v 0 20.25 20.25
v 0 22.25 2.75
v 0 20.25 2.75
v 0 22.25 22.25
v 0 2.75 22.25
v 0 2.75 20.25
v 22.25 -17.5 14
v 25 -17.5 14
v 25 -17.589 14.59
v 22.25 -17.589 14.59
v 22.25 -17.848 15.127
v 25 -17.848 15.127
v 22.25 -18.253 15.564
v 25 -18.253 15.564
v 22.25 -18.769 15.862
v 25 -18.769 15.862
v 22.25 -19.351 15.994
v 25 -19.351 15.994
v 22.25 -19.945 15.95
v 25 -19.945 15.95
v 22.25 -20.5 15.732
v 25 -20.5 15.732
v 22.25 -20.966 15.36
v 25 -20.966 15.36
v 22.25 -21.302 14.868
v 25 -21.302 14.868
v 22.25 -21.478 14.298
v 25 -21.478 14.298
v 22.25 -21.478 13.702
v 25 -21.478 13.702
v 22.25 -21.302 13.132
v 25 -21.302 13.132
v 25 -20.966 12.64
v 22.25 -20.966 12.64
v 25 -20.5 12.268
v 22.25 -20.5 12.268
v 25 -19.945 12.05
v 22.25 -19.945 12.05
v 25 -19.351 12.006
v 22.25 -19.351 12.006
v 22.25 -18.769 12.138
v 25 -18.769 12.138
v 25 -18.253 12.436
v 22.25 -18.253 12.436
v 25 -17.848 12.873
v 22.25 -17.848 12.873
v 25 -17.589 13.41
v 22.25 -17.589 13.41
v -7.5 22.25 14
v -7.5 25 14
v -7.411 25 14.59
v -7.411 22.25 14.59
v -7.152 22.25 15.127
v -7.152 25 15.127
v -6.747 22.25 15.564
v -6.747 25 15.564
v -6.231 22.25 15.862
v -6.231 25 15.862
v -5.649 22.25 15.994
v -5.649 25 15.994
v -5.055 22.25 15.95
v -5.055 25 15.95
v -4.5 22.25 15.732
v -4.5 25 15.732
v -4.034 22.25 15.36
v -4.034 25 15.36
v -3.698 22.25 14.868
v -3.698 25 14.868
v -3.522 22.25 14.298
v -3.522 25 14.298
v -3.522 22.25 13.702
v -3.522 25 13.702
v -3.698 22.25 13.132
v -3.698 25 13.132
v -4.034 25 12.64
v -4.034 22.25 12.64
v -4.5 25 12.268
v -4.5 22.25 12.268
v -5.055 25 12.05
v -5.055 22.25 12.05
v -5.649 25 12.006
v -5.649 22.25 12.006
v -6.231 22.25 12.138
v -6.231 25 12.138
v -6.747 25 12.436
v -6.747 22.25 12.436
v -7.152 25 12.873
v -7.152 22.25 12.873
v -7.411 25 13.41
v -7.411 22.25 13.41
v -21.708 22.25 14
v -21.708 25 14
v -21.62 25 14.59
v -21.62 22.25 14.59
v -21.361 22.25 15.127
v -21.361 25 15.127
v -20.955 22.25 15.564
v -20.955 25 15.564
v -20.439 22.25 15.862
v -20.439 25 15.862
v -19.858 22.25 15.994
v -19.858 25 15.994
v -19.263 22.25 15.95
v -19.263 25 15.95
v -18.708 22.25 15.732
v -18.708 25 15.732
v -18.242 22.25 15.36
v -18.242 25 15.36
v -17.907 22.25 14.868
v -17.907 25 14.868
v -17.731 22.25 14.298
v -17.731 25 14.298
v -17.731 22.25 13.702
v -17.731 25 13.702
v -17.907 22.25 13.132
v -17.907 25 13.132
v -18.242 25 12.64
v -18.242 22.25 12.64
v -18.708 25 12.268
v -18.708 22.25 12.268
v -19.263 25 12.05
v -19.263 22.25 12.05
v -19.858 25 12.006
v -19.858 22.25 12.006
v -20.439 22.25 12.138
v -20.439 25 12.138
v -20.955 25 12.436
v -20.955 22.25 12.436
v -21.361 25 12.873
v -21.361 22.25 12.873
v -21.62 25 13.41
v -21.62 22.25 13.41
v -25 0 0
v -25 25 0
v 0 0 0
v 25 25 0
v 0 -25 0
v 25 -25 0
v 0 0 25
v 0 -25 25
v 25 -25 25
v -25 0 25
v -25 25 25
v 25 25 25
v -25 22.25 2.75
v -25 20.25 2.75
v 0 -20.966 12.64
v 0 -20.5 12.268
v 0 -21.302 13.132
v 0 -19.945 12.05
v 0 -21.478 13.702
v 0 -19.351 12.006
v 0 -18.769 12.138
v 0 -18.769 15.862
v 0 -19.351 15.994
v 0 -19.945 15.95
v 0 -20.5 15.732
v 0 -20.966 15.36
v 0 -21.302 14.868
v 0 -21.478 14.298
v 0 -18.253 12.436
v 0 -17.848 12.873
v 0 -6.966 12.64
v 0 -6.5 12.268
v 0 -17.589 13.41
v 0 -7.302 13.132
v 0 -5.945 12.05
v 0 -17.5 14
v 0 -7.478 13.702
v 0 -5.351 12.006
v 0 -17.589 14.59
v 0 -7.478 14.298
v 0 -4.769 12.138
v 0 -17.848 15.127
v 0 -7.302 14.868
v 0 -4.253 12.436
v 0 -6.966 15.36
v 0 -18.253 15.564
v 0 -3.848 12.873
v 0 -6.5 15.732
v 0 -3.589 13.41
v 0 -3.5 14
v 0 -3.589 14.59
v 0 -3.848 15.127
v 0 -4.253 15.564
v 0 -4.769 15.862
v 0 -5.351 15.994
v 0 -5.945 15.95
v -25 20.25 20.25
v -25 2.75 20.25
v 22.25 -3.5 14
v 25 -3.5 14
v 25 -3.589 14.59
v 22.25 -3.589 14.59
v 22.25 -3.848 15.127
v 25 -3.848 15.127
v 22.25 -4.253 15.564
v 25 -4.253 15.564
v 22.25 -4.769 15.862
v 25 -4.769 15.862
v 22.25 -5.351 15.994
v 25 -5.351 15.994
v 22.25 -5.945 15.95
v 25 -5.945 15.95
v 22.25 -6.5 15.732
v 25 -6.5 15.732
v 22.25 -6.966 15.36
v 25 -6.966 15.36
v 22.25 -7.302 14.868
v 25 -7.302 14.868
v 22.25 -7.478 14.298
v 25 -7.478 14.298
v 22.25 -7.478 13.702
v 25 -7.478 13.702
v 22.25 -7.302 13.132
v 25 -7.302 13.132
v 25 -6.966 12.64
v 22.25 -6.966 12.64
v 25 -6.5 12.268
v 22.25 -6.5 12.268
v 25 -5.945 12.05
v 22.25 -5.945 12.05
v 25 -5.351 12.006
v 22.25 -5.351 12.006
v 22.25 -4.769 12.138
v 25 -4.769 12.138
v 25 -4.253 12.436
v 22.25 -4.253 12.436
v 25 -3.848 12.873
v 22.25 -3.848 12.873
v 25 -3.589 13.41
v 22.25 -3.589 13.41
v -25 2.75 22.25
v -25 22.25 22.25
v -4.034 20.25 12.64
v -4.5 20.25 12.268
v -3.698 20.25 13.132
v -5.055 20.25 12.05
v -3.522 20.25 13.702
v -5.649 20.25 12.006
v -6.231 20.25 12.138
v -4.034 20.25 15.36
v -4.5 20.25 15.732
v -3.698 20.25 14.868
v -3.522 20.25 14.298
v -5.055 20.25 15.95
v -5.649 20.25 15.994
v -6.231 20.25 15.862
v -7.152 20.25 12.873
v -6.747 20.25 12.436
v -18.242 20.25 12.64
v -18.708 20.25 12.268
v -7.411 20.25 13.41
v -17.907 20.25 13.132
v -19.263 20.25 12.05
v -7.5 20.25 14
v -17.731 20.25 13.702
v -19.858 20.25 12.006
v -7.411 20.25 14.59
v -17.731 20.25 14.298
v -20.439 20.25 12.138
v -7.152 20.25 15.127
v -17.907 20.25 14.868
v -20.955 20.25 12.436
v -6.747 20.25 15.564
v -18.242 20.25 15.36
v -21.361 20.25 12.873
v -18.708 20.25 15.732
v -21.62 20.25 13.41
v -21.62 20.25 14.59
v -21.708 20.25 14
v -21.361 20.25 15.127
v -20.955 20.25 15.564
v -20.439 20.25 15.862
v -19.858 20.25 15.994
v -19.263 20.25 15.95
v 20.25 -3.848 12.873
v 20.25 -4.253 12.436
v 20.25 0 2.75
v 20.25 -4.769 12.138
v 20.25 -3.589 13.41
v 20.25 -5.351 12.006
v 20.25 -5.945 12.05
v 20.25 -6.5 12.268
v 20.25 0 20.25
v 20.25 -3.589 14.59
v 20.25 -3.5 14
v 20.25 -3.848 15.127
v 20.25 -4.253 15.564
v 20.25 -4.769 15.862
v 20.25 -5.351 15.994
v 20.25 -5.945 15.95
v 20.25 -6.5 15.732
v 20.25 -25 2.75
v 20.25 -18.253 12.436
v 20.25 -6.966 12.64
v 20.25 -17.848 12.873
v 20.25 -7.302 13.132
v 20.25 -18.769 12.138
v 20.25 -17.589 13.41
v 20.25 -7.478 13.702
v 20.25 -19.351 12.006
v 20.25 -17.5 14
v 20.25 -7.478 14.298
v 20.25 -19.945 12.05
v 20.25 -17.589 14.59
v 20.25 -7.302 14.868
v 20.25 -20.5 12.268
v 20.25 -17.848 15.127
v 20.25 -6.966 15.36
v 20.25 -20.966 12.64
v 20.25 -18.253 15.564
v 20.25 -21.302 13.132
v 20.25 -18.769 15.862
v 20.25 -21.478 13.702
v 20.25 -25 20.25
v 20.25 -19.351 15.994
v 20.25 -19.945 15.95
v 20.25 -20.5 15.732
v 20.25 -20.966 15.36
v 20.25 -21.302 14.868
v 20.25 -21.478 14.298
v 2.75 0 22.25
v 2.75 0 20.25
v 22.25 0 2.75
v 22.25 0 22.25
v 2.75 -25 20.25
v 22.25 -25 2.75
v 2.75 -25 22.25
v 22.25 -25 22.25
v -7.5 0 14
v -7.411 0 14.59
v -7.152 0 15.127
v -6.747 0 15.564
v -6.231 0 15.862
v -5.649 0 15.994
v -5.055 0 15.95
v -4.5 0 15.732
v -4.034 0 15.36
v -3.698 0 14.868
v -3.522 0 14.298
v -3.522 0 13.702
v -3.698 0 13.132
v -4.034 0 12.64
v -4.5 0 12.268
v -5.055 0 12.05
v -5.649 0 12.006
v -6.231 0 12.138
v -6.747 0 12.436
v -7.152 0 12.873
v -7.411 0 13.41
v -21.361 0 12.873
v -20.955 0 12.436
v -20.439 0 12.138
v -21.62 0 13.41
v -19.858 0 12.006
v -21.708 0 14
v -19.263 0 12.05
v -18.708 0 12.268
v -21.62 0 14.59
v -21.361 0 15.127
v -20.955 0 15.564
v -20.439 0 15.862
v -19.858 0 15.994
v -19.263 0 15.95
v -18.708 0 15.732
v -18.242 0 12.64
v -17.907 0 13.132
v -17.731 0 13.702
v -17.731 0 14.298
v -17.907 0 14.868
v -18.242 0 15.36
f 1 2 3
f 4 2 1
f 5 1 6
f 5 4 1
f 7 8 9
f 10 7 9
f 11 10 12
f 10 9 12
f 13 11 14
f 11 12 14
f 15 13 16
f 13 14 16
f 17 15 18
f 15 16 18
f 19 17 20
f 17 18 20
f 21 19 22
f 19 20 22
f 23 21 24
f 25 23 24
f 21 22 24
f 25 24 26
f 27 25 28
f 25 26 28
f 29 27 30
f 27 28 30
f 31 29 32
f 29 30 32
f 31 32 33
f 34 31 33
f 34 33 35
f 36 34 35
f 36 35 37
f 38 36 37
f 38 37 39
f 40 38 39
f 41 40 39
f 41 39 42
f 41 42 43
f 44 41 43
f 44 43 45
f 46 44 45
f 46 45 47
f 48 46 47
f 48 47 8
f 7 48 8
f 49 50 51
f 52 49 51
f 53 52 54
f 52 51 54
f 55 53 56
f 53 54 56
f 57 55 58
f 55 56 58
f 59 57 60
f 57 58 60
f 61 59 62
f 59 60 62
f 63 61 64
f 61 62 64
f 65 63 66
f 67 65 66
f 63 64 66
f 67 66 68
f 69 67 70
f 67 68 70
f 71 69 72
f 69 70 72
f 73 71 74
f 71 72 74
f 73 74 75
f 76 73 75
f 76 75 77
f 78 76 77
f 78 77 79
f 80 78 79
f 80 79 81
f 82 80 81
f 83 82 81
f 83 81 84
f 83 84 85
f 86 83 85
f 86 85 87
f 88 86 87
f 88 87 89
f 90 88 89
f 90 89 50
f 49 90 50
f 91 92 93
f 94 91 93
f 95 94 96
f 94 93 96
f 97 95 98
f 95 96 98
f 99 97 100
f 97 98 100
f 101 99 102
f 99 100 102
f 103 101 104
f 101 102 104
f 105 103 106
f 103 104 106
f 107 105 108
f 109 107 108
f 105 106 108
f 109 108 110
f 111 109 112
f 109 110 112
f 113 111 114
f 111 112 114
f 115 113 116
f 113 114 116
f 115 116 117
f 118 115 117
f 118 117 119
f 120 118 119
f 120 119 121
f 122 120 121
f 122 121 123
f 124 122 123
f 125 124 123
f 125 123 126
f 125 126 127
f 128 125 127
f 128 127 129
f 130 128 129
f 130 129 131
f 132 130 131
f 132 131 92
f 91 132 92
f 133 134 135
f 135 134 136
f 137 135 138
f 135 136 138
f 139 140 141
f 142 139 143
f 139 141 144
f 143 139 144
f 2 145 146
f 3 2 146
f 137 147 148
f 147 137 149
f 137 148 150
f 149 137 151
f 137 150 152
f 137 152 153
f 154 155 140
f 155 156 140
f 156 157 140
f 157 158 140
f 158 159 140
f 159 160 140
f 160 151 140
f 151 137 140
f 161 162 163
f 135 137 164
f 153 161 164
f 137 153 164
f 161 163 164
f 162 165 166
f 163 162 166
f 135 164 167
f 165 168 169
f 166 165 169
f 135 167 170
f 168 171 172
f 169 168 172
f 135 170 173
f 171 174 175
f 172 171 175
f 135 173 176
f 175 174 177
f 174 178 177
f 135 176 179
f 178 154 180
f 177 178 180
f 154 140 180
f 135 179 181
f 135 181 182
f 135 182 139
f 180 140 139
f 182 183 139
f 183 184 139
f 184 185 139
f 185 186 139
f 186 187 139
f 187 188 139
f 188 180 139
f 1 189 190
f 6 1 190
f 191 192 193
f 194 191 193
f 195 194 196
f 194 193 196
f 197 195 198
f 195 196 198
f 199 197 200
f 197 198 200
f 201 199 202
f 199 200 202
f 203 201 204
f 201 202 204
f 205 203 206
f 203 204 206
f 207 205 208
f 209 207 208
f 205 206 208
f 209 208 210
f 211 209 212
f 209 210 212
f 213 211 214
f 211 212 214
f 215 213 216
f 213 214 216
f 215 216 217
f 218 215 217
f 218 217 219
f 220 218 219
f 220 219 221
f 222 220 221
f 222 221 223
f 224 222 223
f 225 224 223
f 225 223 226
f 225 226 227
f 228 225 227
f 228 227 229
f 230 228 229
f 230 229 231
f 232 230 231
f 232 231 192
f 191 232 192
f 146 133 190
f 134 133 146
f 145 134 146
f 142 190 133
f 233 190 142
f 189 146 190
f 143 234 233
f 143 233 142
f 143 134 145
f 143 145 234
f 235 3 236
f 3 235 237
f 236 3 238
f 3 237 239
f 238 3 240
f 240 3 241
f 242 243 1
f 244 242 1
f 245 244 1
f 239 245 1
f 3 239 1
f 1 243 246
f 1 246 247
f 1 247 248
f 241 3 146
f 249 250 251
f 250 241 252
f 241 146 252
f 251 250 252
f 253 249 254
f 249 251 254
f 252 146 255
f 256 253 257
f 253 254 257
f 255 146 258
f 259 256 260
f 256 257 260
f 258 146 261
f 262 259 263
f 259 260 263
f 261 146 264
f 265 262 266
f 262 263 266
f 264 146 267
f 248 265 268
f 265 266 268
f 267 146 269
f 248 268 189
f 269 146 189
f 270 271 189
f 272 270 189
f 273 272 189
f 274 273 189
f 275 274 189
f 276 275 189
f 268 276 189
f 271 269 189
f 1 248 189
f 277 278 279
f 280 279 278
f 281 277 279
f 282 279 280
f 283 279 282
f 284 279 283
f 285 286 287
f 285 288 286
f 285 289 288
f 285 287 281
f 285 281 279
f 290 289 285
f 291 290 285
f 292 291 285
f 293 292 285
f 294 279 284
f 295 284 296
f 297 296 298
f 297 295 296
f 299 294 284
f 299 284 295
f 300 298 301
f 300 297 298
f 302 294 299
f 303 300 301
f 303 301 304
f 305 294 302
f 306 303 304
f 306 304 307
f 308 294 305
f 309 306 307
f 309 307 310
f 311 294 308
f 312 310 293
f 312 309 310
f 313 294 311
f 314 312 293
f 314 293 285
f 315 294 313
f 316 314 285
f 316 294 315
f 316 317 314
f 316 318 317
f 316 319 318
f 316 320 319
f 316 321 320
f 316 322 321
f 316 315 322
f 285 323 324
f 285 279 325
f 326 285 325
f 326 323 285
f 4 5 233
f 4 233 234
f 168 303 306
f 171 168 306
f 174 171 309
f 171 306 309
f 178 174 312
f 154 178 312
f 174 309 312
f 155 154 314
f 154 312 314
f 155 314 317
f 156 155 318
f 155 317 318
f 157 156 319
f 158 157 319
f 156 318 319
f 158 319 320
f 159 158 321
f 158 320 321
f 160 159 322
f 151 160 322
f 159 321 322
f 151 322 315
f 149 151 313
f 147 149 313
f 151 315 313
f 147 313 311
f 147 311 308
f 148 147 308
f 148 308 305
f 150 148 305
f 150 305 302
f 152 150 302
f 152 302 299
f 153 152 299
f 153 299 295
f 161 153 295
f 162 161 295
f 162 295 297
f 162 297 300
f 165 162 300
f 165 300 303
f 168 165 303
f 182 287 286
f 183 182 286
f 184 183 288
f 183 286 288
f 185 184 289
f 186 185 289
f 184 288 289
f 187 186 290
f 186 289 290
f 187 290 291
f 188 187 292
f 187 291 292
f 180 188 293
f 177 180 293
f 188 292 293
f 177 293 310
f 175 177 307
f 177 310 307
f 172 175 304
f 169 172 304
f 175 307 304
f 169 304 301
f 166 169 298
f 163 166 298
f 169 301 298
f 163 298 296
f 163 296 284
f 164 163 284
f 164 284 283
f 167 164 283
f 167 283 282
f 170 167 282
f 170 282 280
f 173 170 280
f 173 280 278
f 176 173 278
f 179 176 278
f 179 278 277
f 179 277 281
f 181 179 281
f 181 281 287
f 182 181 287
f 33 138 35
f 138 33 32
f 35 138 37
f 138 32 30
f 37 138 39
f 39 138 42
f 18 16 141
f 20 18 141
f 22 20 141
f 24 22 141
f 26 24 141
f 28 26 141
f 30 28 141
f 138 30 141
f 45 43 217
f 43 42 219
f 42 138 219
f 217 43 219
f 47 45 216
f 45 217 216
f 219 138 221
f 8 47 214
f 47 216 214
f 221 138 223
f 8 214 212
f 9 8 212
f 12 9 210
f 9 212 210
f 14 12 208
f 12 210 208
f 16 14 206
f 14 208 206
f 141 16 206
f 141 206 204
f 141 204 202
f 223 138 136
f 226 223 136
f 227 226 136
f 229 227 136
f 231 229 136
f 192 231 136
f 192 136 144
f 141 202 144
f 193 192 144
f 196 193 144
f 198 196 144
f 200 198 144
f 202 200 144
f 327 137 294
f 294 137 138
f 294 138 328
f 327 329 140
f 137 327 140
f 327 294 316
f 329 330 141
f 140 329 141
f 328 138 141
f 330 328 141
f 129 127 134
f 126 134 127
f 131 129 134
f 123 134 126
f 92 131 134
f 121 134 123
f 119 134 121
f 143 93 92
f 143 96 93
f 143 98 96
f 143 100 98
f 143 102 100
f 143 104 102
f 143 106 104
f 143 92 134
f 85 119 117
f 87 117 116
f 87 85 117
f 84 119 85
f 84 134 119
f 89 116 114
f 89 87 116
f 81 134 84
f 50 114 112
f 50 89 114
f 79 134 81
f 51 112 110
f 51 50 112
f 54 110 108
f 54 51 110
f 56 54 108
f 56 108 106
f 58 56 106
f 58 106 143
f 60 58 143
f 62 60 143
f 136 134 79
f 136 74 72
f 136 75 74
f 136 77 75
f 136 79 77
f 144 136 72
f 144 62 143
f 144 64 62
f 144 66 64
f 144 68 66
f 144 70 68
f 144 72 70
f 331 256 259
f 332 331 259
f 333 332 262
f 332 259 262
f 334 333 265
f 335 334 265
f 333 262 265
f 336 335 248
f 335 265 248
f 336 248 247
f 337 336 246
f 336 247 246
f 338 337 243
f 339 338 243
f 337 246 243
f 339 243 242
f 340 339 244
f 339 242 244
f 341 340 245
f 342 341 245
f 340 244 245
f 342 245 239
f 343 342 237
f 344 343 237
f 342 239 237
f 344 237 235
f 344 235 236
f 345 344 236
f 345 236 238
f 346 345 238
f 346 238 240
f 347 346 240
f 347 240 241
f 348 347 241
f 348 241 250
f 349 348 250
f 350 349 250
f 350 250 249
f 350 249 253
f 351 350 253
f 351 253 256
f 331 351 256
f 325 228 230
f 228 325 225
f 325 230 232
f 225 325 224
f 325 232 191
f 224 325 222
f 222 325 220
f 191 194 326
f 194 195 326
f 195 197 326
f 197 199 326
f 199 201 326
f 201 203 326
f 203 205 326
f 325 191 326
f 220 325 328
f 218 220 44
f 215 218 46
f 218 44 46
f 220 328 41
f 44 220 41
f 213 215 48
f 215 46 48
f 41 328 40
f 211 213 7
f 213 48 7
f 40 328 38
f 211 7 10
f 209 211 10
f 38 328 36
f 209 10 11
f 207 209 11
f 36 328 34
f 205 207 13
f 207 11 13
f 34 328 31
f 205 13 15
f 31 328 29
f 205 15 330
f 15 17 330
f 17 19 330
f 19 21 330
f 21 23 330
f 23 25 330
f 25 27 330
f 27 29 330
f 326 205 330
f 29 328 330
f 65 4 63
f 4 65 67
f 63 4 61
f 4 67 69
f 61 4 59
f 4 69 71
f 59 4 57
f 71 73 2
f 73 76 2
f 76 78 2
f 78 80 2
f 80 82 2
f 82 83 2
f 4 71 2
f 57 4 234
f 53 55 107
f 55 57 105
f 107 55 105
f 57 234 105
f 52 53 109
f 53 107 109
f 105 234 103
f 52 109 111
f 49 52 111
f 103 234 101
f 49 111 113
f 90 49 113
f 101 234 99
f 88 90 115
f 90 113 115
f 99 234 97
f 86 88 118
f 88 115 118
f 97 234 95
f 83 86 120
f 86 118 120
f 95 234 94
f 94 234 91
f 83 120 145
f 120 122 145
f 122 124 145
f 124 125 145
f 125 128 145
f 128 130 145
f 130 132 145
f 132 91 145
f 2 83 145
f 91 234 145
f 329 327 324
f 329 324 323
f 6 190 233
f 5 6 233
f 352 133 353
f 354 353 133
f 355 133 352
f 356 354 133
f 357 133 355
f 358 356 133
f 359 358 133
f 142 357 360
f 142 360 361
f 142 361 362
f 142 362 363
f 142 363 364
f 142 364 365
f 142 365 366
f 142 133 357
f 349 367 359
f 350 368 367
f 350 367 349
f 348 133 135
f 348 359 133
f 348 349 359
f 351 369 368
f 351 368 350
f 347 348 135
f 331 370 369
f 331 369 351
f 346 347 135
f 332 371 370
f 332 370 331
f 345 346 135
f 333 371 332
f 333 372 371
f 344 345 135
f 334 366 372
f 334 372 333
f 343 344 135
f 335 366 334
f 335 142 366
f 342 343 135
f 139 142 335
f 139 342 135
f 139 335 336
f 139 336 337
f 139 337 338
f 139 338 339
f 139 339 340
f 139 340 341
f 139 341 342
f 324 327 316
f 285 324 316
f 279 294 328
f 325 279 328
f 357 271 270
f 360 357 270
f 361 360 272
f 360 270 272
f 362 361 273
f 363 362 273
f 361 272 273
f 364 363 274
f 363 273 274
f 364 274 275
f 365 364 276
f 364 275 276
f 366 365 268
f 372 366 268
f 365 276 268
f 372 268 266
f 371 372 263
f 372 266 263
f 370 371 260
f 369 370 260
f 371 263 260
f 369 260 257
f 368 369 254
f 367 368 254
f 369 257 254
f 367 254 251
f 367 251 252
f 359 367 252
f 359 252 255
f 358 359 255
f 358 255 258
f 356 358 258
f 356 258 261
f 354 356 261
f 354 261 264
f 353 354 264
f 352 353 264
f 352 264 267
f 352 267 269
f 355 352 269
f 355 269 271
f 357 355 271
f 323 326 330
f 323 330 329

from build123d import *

# Parameters (mm, degrees)
F0_W      = 25
F0_H      = 25
F1_DEPTH  = 25
F2_DEPTH  = 25
F3_DEPTH  = 25
F4_W      = 25
F4_H      = 25
F5_DEPTH  = 25
F6_W      = 17.5
F6_H      = 2
F6_W_2    = 2
F6_H_2    = 17.5
F7_DEPTH  = 25
F8_W      = 2
F8_H      = 2
F8_W_2    = 17.5
F8_H_2    = 17.5
F9_DEPTH  = 25
F10_R     = 2
F11_DEPTH = 25
F12_R     = 2
F13_DEPTH = 25


# Not quite as in the source:
# - a feature names something its author has since deleted; it is built from what else it names


with BuildPart() as f1:
    # F0 (on Top) → F1 (new body)
    with BuildSketch(Plane.XY):
        with Locations((12.5, 12.5)):
            Rectangle(F0_W, F0_H)
    extrude(amount=F1_DEPTH)

    # F2 (add): a face of the model
    f2_faces = [f1.faces().sort_by_distance(p)[0] for p in [
        (12.5, 0, 12.5),
    ]]
    extrude(f2_faces, amount=F2_DEPTH)

    # F3 (add): a face of the model
    f3_faces = [f1.faces().sort_by_distance(p)[0] for p in [
        (0, 0, 12.5),
    ]]
    extrude(f3_faces, amount=F3_DEPTH)

    # F4 (on face) → F5 (cut)
    with BuildSketch(Plane.XY.offset(25)):
        with Locations((-12.5, -12.5)):
            Rectangle(F4_W, F4_H)
    extrude(amount=-F5_DEPTH, mode=Mode.SUBTRACT)

    # F6 (on face) → F7 (cut)
    with BuildSketch(Plane.XZ.offset(25)):
        with Locations((11.5, 21.25)):
            Rectangle(F6_W, F6_H)
        with Locations((21.25, 21.25)):
            Rectangle(F6_W_2, F6_H)
        with Locations((21.25, 11.5)):
            Rectangle(F6_W_2, F6_H_2)
    extrude(amount=-F7_DEPTH, mode=Mode.SUBTRACT)

    # F8 (on face) → F9 (cut)
    with BuildSketch(Plane(origin=(-25, 0, 0), x_dir=(0, -1, 0), z_dir=(-1, 0, 0))):
        with Locations((-21.25, 21.25)):
            Rectangle(F8_W, F8_H)
        with Locations((-11.5, 21.25)):
            Rectangle(F8_W_2, F8_H)
        with Locations((-21.25, 11.5)):
            Rectangle(F8_W, F8_H_2)
    extrude(amount=-F9_DEPTH, mode=Mode.SUBTRACT)

    # F10 (on face) → F11 (cut)
    with BuildSketch(Plane(origin=(0, 25, 0), x_dir=(-1, 0, 0), z_dir=(0, 1, 0))):
        with Locations((19.7084973779, 14)):
            Circle(F10_R)
        with Locations((5.5, 14)):
            Circle(F10_R)
    extrude(amount=-F11_DEPTH, mode=Mode.SUBTRACT)

    # F12 (on face) → F13 (cut)
    with BuildSketch(Plane.YZ.offset(25)):
        with Locations((-19.5, 14)):
            Circle(F12_R)
        with Locations((-5.5, 14)):
            Circle(F12_R)
    extrude(amount=-F13_DEPTH, mode=Mode.SUBTRACT)


solid = f1.part
